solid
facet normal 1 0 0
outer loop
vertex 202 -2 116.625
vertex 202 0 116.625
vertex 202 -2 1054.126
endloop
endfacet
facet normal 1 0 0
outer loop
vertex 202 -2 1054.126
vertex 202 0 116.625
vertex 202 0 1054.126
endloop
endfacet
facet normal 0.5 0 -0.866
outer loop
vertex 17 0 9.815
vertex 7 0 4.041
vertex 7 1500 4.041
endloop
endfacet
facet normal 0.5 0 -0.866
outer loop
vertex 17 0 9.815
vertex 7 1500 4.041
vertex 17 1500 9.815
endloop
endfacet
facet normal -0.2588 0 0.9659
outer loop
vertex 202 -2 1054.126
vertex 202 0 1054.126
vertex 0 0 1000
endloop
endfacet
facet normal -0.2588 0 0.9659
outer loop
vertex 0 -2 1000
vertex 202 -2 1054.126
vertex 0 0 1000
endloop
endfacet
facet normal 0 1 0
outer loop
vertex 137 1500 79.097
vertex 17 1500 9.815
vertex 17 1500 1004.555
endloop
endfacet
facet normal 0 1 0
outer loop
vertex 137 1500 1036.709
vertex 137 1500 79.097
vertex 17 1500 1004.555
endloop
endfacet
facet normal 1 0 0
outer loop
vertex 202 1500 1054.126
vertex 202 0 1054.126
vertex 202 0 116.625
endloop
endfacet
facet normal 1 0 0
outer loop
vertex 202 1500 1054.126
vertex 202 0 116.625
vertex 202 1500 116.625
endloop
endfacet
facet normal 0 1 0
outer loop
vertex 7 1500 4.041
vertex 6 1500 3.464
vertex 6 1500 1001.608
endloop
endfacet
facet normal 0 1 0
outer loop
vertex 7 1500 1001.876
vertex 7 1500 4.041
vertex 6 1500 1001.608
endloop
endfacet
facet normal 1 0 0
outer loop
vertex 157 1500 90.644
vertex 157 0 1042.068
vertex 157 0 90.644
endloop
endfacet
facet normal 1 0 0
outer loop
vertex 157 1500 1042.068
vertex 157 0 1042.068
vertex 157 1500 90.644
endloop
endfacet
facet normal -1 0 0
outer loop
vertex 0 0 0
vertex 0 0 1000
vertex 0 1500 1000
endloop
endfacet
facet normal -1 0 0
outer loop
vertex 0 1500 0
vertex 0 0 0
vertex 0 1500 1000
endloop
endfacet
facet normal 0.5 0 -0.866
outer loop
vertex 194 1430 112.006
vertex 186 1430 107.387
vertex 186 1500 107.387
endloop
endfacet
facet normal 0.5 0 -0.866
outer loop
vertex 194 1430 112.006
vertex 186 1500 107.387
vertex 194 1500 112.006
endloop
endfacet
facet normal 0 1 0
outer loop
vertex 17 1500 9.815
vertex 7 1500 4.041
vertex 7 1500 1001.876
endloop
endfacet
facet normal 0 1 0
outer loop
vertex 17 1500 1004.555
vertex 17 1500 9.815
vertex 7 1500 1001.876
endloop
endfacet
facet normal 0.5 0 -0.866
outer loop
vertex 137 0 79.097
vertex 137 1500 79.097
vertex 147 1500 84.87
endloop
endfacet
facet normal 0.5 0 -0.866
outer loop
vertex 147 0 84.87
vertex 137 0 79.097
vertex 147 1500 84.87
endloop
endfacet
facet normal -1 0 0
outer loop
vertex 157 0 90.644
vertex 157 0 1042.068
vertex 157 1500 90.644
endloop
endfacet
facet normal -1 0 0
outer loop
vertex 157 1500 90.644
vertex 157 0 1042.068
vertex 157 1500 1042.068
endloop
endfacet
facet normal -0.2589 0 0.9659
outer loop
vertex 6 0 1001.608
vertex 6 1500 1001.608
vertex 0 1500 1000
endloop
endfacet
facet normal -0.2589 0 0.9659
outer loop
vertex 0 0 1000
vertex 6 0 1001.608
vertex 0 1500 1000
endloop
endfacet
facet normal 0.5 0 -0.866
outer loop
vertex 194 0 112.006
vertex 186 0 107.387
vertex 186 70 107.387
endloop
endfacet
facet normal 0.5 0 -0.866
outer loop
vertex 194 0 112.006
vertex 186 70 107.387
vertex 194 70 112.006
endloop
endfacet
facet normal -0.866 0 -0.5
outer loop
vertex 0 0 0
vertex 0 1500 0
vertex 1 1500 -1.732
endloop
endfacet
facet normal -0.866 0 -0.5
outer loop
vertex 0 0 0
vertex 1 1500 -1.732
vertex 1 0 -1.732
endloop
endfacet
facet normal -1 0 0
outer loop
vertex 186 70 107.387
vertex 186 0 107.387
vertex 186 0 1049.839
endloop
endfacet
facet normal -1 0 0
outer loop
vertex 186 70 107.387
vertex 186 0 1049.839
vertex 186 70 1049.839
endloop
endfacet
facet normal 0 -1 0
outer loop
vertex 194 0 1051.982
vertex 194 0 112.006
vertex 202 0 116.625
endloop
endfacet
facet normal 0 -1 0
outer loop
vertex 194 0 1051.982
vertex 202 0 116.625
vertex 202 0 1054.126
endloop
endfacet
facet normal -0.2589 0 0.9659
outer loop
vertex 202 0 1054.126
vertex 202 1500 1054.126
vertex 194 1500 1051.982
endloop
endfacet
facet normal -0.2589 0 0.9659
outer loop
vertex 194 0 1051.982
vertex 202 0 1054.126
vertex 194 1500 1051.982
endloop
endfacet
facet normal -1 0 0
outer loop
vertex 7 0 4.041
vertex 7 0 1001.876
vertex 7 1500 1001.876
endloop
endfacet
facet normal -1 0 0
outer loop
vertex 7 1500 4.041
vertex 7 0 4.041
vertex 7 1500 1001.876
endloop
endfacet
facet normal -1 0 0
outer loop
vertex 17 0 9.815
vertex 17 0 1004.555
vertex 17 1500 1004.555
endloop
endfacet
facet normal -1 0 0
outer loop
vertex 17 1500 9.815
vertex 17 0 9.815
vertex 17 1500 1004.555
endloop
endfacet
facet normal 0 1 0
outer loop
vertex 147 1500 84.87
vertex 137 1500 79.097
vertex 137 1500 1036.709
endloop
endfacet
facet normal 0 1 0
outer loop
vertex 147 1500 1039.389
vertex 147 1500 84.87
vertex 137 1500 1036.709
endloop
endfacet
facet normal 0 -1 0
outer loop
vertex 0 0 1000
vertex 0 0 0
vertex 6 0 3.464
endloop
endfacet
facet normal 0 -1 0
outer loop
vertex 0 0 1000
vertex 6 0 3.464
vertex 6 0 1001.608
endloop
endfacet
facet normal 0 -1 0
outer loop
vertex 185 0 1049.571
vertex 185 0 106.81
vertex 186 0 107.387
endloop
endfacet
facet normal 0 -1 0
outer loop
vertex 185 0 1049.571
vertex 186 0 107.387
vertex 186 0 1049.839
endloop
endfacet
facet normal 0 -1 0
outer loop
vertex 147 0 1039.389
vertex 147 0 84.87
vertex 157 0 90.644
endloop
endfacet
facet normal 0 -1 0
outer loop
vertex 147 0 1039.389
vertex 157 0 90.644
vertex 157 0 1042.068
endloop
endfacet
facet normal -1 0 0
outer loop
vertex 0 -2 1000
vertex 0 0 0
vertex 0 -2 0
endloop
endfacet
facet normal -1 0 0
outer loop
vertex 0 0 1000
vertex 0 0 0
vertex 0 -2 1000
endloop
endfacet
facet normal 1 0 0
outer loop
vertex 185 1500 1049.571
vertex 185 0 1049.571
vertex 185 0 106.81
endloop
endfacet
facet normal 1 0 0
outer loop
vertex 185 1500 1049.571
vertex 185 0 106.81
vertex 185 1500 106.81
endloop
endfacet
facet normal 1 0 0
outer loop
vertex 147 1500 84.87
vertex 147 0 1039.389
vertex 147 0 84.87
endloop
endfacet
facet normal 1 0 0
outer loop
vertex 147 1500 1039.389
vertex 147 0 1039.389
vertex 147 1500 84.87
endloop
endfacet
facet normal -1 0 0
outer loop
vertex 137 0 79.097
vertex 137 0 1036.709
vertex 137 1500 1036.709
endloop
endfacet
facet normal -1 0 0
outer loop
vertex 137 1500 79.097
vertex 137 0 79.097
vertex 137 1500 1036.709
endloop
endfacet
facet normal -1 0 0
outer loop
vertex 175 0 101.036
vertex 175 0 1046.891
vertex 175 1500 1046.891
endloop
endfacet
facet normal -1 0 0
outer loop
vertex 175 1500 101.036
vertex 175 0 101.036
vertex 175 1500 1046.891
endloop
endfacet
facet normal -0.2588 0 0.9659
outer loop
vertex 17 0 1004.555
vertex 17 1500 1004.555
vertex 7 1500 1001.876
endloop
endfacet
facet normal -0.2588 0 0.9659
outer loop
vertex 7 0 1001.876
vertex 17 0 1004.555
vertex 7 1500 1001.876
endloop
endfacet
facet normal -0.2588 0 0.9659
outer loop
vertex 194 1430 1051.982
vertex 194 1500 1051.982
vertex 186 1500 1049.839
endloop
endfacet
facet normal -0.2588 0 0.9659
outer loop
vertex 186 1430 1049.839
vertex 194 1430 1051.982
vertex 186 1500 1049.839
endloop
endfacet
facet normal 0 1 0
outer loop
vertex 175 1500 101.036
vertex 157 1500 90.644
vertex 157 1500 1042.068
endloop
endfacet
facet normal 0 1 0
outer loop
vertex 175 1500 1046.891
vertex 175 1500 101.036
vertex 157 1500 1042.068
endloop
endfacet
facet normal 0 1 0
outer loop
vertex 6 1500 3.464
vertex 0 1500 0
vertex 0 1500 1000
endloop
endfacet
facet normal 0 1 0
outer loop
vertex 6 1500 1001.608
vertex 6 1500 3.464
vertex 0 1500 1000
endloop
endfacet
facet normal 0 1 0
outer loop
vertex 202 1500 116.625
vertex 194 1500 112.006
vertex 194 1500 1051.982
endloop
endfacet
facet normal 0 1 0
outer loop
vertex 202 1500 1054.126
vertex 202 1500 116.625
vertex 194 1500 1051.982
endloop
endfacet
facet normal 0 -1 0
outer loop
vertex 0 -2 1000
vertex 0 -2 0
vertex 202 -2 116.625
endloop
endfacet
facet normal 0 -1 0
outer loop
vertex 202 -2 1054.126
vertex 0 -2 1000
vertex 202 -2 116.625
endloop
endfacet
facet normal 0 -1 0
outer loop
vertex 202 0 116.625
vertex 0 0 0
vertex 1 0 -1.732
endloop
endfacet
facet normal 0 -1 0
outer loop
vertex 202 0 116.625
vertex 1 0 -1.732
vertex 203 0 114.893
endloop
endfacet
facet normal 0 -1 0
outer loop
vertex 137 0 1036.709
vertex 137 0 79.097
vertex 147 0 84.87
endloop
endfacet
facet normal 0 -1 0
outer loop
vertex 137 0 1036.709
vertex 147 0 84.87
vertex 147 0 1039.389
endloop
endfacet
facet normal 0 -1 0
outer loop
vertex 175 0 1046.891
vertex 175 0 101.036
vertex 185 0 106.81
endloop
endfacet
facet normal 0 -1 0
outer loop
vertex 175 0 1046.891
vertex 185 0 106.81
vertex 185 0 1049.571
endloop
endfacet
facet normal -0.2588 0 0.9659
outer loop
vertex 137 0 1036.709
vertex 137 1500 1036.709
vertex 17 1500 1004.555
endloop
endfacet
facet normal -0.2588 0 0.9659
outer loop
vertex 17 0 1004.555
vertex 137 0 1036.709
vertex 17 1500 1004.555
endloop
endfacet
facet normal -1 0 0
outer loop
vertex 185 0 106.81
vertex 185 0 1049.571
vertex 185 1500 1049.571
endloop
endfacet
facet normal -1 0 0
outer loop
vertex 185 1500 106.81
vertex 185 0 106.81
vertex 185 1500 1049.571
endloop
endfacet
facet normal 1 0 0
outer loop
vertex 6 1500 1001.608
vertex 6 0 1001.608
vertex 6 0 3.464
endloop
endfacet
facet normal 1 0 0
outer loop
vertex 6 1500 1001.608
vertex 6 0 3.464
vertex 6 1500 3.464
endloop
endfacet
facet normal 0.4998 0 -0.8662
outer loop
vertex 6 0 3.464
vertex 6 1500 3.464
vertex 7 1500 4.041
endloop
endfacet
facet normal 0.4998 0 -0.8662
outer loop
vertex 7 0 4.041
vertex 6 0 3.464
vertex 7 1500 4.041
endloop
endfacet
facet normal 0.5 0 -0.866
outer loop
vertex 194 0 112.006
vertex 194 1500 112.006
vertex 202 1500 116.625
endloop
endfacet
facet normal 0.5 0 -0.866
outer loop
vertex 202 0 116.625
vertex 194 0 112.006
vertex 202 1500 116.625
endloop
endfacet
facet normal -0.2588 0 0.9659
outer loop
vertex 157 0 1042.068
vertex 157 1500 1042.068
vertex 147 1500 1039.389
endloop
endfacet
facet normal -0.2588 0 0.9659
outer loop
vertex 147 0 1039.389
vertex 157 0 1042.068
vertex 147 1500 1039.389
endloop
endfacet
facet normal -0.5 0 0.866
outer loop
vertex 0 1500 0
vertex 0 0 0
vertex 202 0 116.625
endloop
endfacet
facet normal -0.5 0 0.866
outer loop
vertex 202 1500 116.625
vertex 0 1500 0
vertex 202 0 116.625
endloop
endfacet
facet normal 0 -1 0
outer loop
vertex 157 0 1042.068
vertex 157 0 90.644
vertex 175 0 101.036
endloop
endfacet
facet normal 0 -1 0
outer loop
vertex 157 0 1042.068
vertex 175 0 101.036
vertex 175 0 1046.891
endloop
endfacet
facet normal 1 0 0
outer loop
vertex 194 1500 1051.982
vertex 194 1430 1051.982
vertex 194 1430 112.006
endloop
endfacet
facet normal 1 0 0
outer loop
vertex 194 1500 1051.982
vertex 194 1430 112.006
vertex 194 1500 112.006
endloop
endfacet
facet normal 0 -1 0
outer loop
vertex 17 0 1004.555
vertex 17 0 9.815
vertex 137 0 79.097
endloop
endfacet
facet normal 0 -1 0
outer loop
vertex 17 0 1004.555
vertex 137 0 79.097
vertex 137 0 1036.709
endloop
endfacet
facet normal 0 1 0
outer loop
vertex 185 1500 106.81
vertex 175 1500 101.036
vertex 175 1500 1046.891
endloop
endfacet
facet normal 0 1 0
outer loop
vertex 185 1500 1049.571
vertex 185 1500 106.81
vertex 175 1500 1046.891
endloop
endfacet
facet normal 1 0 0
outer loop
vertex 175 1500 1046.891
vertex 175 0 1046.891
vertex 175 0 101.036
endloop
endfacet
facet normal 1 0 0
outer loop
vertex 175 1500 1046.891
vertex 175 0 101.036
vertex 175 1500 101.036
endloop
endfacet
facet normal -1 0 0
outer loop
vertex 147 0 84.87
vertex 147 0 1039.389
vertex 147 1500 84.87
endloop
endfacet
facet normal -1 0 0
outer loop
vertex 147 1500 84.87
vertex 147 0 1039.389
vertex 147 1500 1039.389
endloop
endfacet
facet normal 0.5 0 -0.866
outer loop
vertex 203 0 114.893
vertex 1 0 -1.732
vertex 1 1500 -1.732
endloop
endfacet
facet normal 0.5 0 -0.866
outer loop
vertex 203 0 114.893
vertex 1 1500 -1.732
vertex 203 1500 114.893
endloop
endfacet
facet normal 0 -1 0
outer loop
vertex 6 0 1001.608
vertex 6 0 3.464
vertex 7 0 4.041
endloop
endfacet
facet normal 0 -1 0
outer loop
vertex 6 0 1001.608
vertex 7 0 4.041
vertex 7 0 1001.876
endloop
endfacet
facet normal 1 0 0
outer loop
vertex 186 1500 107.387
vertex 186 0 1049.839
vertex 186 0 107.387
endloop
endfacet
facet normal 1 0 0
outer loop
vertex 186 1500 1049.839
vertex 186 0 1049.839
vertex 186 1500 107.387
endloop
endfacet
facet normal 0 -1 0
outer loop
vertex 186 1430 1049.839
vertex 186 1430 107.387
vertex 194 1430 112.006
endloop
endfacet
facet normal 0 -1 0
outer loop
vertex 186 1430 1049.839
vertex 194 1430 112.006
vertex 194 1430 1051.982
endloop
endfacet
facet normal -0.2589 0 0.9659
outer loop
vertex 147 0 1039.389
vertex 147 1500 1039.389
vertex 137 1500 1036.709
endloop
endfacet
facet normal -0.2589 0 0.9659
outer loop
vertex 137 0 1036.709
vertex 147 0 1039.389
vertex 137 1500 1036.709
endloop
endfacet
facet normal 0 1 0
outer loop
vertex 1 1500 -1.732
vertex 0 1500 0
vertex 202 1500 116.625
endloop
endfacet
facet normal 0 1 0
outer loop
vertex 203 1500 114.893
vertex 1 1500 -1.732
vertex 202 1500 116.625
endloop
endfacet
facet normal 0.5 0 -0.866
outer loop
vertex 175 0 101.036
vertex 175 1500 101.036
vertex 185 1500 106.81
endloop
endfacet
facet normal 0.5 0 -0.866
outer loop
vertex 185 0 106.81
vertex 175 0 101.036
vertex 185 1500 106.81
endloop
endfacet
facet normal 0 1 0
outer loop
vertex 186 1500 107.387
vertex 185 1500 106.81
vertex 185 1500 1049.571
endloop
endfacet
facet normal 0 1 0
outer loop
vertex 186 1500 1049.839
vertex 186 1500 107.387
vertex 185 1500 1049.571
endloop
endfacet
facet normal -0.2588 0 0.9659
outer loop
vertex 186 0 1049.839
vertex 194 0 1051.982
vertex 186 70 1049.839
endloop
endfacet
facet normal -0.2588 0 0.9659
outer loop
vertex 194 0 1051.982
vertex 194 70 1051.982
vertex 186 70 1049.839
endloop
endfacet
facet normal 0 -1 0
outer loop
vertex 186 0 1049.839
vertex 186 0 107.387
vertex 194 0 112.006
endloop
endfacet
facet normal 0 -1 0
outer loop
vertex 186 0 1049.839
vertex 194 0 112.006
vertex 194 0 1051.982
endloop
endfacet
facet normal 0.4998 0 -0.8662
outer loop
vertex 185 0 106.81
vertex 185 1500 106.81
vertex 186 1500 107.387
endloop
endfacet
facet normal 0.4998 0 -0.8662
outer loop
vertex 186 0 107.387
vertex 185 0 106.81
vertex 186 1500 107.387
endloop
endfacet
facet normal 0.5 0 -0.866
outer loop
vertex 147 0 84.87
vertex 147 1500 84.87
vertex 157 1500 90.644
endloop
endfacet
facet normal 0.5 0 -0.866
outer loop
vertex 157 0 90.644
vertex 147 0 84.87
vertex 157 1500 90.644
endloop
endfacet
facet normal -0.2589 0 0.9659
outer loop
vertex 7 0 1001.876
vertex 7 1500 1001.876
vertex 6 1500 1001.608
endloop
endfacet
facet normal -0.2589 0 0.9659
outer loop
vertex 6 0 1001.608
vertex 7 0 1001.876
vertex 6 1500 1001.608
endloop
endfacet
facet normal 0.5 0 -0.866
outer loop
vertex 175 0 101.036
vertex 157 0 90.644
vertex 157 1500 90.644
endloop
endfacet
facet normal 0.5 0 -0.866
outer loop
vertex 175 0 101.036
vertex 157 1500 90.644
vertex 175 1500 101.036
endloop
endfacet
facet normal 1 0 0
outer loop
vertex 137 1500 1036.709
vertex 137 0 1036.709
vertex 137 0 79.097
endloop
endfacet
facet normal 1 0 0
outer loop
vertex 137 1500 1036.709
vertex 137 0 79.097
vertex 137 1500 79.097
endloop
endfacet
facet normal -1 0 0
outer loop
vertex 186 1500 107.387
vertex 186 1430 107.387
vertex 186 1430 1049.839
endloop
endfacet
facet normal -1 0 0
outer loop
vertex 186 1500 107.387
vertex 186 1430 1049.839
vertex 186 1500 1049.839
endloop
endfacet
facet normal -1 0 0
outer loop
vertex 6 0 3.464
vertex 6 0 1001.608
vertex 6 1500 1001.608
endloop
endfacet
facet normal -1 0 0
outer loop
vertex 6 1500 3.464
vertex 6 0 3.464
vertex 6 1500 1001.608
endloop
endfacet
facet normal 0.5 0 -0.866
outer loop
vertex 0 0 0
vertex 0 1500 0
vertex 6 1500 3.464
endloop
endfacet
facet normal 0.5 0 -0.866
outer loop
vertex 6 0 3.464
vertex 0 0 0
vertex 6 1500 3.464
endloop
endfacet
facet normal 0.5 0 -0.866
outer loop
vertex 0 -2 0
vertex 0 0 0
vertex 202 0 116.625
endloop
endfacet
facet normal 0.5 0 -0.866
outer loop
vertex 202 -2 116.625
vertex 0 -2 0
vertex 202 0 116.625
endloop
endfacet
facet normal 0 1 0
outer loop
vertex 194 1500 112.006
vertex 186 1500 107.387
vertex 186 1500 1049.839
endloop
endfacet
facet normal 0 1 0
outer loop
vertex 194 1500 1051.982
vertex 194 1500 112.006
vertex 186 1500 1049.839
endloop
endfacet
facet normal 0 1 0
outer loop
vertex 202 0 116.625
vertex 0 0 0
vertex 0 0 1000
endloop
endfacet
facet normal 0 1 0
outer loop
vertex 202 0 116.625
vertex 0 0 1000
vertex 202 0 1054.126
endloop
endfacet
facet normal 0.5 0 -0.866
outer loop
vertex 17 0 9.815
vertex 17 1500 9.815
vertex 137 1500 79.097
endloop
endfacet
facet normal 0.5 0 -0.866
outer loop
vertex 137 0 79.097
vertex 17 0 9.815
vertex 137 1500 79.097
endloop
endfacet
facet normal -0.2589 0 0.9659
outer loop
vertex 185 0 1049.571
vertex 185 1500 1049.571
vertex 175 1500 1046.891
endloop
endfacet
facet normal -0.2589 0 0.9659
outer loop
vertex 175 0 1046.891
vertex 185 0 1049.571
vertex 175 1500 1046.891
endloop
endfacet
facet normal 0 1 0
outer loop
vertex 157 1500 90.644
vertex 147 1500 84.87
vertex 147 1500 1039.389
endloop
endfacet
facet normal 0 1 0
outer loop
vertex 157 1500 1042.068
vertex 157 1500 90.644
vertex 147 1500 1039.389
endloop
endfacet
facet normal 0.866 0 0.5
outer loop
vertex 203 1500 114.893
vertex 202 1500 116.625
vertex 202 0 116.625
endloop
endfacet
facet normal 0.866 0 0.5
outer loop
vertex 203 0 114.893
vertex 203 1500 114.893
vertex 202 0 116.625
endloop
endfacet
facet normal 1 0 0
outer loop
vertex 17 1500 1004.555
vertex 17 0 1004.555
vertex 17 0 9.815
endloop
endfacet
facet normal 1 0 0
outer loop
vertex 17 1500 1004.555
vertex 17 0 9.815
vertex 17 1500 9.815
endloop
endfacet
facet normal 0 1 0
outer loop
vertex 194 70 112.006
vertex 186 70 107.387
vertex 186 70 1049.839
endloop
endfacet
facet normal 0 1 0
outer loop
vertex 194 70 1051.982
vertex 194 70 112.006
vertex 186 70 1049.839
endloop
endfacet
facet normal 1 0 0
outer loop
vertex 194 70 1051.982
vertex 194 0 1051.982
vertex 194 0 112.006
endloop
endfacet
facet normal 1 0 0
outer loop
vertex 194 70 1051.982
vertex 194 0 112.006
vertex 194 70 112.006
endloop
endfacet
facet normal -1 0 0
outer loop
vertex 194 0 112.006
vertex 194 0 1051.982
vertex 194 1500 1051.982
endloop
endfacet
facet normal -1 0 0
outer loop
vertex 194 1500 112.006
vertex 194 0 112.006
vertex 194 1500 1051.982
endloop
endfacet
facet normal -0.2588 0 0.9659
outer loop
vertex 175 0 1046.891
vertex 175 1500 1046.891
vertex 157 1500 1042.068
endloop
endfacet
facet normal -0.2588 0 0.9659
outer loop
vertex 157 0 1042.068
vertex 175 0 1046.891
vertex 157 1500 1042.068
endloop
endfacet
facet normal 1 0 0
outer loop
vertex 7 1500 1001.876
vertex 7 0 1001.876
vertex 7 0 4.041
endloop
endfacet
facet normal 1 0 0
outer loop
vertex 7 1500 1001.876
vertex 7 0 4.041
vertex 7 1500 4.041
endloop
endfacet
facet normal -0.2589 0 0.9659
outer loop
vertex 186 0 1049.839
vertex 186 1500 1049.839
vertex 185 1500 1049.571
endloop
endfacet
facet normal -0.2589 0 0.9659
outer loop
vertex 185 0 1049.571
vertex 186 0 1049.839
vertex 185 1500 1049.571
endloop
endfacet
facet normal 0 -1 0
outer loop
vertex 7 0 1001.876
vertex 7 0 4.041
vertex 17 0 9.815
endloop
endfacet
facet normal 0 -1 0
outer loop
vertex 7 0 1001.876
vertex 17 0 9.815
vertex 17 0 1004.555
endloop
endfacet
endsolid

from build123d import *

# Parameters (mm, degrees)
F0_W      = 1500
F0_H      = 1200
F1_DEPTH  = 6
F2_DEPTH  = 1
F3_DEPTH  = 10
F4_DEPTH  = 120
F5_DEPTH  = 10
F6_DEPTH  = 10
F7_DEPTH  = 18
F8_DEPTH  = 10
F9_DEPTH  = 1
F10_W     = 70
F10_H     = 1200
F11_DEPTH = 8
F12_W     = 1500
F12_H     = 1200
F13_DEPTH = 8
F14_W     = 202
F14_H     = 1200
F15_DEPTH = 2
F17_DEPTH = 1502.001
F18_W     = 233.2495087526
F18_H     = 1500
F19_DEPTH = 2


with BuildPart() as f1:
    # F0 (on Right) → F1 (new body)
    with BuildSketch(Plane.YZ):
        with Locations((750, 600)):
            Rectangle(F0_W, F0_H)
    extrude(amount=F1_DEPTH)


with BuildPart() as f2:
    # F2 (new): a face of the model
    f2_faces = [f1.part.faces().sort_by_distance(p)[0] for p in [
        (6, 750, 600),
    ]]
    extrude(f2_faces, amount=F2_DEPTH)


with BuildPart() as f3:
    # F3 (new): a face of the model
    f3_faces = [f2.part.faces().sort_by_distance(p)[0] for p in [
        (7, 750, 600),
    ]]
    extrude(f3_faces, amount=F3_DEPTH)


with BuildPart() as f4:
    # F4 (new): a face of the model
    f4_faces = [f3.part.faces().sort_by_distance(p)[0] for p in [
        (17, 750, 600),
    ]]
    extrude(f4_faces, amount=F4_DEPTH)


with BuildPart() as f5:
    # F5 (new): a face of the model
    f5_faces = [f4.part.faces().sort_by_distance(p)[0] for p in [
        (137, 750, 600),
    ]]
    extrude(f5_faces, amount=F5_DEPTH)


with BuildPart() as f6:
    # F6 (new): a face of the model
    f6_faces = [f5.part.faces().sort_by_distance(p)[0] for p in [
        (147, 750, 600),
    ]]
    extrude(f6_faces, amount=F6_DEPTH)


with BuildPart() as f7:
    # F7 (new): a face of the model
    f7_faces = [f6.part.faces().sort_by_distance(p)[0] for p in [
        (157, 750, 600),
    ]]
    extrude(f7_faces, amount=F7_DEPTH)


with BuildPart() as f8:
    # F8 (new): a face of the model
    f8_faces = [f7.part.faces().sort_by_distance(p)[0] for p in [
        (175, 750, 600),
    ]]
    extrude(f8_faces, amount=F8_DEPTH)


with BuildPart() as f9:
    # F9 (new): a face of the model
    f9_faces = [f8.part.faces().sort_by_distance(p)[0] for p in [
        (185, 750, 600),
    ]]
    extrude(f9_faces, amount=F9_DEPTH)


with BuildPart() as f11:
    # F10 (on face) → F11 (new body)
    with BuildSketch(Plane.YZ.offset(186)):
        with Locations((35, 600)):
            Rectangle(F10_W, F10_H)
    extrude(amount=F11_DEPTH)


with BuildPart() as f11b:
    # F10 (on face) → F11, piece 2 (new body)
    with BuildSketch(Plane.YZ.offset(186)):
        with Locations((1465, 600)):
            Rectangle(F10_W, F10_H)
    extrude(amount=F11_DEPTH)


with BuildPart() as f13:
    # F12 (on face) → F13 (new body)
    with BuildSketch(Plane.YZ.offset(194)):
        with Locations((750, 600)):
            Rectangle(F12_W, F12_H)
    extrude(amount=F13_DEPTH)


with BuildPart() as f15:
    # F14 (on face) → F15 (new body)
    with BuildSketch(Plane.XZ):
        with Locations((101, 600)):
            Rectangle(F14_W, F14_H)
    extrude(amount=F15_DEPTH)


with BuildPart() as f17_tool:
    # F16 (on face) → F17 (new body, through all)
    with BuildSketch(Plane(origin=(0, 1500, 0), x_dir=(-1, 0, 0), z_dir=(0, 1, 0))):
        Polygon((-202, 0), (0, 0), (-202, 116.6247543763), align=None)
        Polygon((0, 1000), (0, 1200), (-202, 1200), (-202, 1054.1257368711), align=None)
    extrude(amount=-F17_DEPTH)


with BuildPart() as f1_1:
    add(f1.part)

    # F17: cut by f17_tool
    add(f17_tool.part, mode=Mode.SUBTRACT)


with BuildPart() as f2_1:
    add(f2.part)

    # F17: cut by f17_tool
    add(f17_tool.part, mode=Mode.SUBTRACT)


with BuildPart() as f3_1:
    add(f3.part)

    # F17: cut by f17_tool
    add(f17_tool.part, mode=Mode.SUBTRACT)


with BuildPart() as f4_1:
    add(f4.part)

    # F17: cut by f17_tool
    add(f17_tool.part, mode=Mode.SUBTRACT)


with BuildPart() as f5_1:
    add(f5.part)

    # F17: cut by f17_tool
    add(f17_tool.part, mode=Mode.SUBTRACT)


with BuildPart() as f6_1:
    add(f6.part)

    # F17: cut by f17_tool
    add(f17_tool.part, mode=Mode.SUBTRACT)


with BuildPart() as f7_1:
    add(f7.part)

    # F17: cut by f17_tool
    add(f17_tool.part, mode=Mode.SUBTRACT)


with BuildPart() as f8_1:
    add(f8.part)

    # F17: cut by f17_tool
    add(f17_tool.part, mode=Mode.SUBTRACT)


with BuildPart() as f9_1:
    add(f9.part)

    # F17: cut by f17_tool
    add(f17_tool.part, mode=Mode.SUBTRACT)


with BuildPart() as f11_1:
    add(f11.part)

    # F17: cut by f17_tool
    add(f17_tool.part, mode=Mode.SUBTRACT)


with BuildPart() as f11b_1:
    add(f11b.part)

    # F17: cut by f17_tool
    add(f17_tool.part, mode=Mode.SUBTRACT)


with BuildPart() as f13_1:
    add(f13.part)

    # F17: cut by f17_tool
    add(f17_tool.part, mode=Mode.SUBTRACT)


with BuildPart() as f15_1:
    add(f15.part)

    # F17: cut by f17_tool
    add(f17_tool.part, mode=Mode.SUBTRACT)


with BuildPart() as f19:
    # F18 (on face) → F19 (new body)
    with BuildSketch(Plane(origin=(0, 0, 0), x_dir=(0.8660254038, 0, 0.5), z_dir=(0.5, 0, -0.8660254038))):
        with Locations((116.6247543763, -750)):
            Rectangle(F18_W, F18_H)
    extrude(amount=F19_DEPTH)


solid = Compound([f1_1.part, f2_1.part, f3_1.part, f4_1.part, f5_1.part, f6_1.part, f7_1.part, f8_1.part, f9_1.part, f11_1.part, f11b_1.part, f13_1.part, f15_1.part, f19.part])
